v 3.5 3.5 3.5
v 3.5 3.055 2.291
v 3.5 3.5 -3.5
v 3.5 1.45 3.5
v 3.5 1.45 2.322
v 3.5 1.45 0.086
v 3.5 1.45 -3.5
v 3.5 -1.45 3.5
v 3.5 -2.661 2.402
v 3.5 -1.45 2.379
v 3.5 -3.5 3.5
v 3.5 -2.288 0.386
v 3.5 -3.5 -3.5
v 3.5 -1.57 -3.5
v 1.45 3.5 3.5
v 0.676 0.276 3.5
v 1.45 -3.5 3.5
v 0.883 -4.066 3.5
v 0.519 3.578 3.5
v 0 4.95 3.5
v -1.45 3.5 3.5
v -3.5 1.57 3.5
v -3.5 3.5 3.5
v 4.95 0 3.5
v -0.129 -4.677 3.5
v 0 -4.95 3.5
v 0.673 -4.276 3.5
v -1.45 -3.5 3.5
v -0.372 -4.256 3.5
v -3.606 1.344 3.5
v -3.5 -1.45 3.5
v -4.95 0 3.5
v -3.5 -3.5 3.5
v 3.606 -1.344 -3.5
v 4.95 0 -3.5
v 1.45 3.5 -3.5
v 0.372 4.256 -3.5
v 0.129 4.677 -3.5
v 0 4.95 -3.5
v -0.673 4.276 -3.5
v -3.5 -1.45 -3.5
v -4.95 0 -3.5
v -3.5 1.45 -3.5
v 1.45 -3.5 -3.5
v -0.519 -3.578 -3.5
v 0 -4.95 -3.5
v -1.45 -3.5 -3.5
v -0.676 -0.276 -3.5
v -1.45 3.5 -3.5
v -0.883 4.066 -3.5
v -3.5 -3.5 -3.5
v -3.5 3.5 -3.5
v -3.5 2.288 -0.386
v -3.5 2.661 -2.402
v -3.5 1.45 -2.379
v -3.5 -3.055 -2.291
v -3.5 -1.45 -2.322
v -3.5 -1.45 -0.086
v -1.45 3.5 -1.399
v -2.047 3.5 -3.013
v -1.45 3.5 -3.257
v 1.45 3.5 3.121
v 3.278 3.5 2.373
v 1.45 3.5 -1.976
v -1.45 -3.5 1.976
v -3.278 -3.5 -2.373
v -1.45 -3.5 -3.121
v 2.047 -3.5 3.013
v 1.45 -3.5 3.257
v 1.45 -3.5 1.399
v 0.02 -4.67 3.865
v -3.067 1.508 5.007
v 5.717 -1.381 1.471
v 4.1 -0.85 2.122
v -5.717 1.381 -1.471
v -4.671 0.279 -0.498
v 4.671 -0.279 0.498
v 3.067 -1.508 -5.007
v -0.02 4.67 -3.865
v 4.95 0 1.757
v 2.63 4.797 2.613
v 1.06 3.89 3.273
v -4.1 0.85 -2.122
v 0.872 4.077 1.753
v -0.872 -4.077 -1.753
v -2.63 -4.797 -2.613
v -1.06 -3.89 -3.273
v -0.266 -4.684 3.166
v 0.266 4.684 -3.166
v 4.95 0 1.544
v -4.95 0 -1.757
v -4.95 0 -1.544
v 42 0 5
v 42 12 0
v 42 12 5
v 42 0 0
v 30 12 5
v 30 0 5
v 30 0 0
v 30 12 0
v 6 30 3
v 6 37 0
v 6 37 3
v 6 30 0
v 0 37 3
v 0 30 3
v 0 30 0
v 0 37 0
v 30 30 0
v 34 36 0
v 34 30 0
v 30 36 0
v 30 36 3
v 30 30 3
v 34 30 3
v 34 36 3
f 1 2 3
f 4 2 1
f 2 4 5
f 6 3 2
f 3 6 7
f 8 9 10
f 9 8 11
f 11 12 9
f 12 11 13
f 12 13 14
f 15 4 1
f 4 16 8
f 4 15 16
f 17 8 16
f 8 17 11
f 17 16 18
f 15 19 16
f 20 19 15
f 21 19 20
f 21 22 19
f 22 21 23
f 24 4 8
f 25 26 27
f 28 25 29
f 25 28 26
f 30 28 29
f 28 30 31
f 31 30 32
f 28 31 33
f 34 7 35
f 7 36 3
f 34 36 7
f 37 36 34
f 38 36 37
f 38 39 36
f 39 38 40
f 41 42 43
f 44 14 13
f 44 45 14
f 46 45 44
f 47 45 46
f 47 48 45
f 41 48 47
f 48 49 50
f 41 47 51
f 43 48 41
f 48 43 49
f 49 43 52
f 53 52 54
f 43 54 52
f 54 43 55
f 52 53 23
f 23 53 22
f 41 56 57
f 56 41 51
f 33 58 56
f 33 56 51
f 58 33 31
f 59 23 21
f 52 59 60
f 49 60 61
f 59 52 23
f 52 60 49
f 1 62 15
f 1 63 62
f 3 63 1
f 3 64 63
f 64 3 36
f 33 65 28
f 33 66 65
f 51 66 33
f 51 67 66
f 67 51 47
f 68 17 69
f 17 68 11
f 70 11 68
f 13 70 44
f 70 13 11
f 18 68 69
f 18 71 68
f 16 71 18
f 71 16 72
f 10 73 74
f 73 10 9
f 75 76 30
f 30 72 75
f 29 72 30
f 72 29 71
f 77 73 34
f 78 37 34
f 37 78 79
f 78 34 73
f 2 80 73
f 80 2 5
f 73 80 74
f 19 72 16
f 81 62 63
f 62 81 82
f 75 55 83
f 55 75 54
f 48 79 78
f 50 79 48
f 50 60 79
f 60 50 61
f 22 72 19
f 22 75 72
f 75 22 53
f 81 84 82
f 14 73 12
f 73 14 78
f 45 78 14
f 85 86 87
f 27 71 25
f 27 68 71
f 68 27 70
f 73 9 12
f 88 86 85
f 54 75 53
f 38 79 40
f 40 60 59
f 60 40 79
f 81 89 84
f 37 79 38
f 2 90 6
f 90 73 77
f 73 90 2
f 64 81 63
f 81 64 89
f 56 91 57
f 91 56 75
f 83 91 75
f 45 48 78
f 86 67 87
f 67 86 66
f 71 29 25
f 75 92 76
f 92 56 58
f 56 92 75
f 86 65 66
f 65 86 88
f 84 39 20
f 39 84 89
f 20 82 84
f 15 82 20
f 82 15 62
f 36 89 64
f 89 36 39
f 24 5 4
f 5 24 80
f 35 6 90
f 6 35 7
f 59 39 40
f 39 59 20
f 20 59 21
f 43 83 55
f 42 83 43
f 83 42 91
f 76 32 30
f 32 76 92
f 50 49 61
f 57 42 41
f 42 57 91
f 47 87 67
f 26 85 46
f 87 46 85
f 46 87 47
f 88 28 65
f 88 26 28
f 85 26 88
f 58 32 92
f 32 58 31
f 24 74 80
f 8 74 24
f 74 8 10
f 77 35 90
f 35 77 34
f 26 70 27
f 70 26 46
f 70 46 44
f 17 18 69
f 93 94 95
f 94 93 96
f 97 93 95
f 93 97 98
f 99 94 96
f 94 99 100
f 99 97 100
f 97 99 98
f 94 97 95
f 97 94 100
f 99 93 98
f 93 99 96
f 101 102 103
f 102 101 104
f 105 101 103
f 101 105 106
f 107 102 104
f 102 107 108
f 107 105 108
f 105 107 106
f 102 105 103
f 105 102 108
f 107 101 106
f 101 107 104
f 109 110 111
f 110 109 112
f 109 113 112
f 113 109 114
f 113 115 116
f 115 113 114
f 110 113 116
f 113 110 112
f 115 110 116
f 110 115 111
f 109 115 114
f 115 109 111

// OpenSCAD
// arguments whose scalar-vs-vector shape is only known at runtime, plus builtins with OpenSCAD semantics
function dim(p) = p == "w" ? 12 : 7;
module dim(h) { cube([dim("w"), dim("w"), h]); }
for (a = [[0, 0, 0], [10, 20, 30], [0, 90, 45]]) rotate(a) cube(dim("t"), center = true);
translate([30, 0, 0]) dim(5);
translate([0, 30, 0]) render() cube([round(2.5) * 2, lookup(5, [[0, 2], [10, 12]]), sign(-3) + 4]);
s = [4, 6];
translate([30, 30, 0]) linear_extrude(3) square(s);
